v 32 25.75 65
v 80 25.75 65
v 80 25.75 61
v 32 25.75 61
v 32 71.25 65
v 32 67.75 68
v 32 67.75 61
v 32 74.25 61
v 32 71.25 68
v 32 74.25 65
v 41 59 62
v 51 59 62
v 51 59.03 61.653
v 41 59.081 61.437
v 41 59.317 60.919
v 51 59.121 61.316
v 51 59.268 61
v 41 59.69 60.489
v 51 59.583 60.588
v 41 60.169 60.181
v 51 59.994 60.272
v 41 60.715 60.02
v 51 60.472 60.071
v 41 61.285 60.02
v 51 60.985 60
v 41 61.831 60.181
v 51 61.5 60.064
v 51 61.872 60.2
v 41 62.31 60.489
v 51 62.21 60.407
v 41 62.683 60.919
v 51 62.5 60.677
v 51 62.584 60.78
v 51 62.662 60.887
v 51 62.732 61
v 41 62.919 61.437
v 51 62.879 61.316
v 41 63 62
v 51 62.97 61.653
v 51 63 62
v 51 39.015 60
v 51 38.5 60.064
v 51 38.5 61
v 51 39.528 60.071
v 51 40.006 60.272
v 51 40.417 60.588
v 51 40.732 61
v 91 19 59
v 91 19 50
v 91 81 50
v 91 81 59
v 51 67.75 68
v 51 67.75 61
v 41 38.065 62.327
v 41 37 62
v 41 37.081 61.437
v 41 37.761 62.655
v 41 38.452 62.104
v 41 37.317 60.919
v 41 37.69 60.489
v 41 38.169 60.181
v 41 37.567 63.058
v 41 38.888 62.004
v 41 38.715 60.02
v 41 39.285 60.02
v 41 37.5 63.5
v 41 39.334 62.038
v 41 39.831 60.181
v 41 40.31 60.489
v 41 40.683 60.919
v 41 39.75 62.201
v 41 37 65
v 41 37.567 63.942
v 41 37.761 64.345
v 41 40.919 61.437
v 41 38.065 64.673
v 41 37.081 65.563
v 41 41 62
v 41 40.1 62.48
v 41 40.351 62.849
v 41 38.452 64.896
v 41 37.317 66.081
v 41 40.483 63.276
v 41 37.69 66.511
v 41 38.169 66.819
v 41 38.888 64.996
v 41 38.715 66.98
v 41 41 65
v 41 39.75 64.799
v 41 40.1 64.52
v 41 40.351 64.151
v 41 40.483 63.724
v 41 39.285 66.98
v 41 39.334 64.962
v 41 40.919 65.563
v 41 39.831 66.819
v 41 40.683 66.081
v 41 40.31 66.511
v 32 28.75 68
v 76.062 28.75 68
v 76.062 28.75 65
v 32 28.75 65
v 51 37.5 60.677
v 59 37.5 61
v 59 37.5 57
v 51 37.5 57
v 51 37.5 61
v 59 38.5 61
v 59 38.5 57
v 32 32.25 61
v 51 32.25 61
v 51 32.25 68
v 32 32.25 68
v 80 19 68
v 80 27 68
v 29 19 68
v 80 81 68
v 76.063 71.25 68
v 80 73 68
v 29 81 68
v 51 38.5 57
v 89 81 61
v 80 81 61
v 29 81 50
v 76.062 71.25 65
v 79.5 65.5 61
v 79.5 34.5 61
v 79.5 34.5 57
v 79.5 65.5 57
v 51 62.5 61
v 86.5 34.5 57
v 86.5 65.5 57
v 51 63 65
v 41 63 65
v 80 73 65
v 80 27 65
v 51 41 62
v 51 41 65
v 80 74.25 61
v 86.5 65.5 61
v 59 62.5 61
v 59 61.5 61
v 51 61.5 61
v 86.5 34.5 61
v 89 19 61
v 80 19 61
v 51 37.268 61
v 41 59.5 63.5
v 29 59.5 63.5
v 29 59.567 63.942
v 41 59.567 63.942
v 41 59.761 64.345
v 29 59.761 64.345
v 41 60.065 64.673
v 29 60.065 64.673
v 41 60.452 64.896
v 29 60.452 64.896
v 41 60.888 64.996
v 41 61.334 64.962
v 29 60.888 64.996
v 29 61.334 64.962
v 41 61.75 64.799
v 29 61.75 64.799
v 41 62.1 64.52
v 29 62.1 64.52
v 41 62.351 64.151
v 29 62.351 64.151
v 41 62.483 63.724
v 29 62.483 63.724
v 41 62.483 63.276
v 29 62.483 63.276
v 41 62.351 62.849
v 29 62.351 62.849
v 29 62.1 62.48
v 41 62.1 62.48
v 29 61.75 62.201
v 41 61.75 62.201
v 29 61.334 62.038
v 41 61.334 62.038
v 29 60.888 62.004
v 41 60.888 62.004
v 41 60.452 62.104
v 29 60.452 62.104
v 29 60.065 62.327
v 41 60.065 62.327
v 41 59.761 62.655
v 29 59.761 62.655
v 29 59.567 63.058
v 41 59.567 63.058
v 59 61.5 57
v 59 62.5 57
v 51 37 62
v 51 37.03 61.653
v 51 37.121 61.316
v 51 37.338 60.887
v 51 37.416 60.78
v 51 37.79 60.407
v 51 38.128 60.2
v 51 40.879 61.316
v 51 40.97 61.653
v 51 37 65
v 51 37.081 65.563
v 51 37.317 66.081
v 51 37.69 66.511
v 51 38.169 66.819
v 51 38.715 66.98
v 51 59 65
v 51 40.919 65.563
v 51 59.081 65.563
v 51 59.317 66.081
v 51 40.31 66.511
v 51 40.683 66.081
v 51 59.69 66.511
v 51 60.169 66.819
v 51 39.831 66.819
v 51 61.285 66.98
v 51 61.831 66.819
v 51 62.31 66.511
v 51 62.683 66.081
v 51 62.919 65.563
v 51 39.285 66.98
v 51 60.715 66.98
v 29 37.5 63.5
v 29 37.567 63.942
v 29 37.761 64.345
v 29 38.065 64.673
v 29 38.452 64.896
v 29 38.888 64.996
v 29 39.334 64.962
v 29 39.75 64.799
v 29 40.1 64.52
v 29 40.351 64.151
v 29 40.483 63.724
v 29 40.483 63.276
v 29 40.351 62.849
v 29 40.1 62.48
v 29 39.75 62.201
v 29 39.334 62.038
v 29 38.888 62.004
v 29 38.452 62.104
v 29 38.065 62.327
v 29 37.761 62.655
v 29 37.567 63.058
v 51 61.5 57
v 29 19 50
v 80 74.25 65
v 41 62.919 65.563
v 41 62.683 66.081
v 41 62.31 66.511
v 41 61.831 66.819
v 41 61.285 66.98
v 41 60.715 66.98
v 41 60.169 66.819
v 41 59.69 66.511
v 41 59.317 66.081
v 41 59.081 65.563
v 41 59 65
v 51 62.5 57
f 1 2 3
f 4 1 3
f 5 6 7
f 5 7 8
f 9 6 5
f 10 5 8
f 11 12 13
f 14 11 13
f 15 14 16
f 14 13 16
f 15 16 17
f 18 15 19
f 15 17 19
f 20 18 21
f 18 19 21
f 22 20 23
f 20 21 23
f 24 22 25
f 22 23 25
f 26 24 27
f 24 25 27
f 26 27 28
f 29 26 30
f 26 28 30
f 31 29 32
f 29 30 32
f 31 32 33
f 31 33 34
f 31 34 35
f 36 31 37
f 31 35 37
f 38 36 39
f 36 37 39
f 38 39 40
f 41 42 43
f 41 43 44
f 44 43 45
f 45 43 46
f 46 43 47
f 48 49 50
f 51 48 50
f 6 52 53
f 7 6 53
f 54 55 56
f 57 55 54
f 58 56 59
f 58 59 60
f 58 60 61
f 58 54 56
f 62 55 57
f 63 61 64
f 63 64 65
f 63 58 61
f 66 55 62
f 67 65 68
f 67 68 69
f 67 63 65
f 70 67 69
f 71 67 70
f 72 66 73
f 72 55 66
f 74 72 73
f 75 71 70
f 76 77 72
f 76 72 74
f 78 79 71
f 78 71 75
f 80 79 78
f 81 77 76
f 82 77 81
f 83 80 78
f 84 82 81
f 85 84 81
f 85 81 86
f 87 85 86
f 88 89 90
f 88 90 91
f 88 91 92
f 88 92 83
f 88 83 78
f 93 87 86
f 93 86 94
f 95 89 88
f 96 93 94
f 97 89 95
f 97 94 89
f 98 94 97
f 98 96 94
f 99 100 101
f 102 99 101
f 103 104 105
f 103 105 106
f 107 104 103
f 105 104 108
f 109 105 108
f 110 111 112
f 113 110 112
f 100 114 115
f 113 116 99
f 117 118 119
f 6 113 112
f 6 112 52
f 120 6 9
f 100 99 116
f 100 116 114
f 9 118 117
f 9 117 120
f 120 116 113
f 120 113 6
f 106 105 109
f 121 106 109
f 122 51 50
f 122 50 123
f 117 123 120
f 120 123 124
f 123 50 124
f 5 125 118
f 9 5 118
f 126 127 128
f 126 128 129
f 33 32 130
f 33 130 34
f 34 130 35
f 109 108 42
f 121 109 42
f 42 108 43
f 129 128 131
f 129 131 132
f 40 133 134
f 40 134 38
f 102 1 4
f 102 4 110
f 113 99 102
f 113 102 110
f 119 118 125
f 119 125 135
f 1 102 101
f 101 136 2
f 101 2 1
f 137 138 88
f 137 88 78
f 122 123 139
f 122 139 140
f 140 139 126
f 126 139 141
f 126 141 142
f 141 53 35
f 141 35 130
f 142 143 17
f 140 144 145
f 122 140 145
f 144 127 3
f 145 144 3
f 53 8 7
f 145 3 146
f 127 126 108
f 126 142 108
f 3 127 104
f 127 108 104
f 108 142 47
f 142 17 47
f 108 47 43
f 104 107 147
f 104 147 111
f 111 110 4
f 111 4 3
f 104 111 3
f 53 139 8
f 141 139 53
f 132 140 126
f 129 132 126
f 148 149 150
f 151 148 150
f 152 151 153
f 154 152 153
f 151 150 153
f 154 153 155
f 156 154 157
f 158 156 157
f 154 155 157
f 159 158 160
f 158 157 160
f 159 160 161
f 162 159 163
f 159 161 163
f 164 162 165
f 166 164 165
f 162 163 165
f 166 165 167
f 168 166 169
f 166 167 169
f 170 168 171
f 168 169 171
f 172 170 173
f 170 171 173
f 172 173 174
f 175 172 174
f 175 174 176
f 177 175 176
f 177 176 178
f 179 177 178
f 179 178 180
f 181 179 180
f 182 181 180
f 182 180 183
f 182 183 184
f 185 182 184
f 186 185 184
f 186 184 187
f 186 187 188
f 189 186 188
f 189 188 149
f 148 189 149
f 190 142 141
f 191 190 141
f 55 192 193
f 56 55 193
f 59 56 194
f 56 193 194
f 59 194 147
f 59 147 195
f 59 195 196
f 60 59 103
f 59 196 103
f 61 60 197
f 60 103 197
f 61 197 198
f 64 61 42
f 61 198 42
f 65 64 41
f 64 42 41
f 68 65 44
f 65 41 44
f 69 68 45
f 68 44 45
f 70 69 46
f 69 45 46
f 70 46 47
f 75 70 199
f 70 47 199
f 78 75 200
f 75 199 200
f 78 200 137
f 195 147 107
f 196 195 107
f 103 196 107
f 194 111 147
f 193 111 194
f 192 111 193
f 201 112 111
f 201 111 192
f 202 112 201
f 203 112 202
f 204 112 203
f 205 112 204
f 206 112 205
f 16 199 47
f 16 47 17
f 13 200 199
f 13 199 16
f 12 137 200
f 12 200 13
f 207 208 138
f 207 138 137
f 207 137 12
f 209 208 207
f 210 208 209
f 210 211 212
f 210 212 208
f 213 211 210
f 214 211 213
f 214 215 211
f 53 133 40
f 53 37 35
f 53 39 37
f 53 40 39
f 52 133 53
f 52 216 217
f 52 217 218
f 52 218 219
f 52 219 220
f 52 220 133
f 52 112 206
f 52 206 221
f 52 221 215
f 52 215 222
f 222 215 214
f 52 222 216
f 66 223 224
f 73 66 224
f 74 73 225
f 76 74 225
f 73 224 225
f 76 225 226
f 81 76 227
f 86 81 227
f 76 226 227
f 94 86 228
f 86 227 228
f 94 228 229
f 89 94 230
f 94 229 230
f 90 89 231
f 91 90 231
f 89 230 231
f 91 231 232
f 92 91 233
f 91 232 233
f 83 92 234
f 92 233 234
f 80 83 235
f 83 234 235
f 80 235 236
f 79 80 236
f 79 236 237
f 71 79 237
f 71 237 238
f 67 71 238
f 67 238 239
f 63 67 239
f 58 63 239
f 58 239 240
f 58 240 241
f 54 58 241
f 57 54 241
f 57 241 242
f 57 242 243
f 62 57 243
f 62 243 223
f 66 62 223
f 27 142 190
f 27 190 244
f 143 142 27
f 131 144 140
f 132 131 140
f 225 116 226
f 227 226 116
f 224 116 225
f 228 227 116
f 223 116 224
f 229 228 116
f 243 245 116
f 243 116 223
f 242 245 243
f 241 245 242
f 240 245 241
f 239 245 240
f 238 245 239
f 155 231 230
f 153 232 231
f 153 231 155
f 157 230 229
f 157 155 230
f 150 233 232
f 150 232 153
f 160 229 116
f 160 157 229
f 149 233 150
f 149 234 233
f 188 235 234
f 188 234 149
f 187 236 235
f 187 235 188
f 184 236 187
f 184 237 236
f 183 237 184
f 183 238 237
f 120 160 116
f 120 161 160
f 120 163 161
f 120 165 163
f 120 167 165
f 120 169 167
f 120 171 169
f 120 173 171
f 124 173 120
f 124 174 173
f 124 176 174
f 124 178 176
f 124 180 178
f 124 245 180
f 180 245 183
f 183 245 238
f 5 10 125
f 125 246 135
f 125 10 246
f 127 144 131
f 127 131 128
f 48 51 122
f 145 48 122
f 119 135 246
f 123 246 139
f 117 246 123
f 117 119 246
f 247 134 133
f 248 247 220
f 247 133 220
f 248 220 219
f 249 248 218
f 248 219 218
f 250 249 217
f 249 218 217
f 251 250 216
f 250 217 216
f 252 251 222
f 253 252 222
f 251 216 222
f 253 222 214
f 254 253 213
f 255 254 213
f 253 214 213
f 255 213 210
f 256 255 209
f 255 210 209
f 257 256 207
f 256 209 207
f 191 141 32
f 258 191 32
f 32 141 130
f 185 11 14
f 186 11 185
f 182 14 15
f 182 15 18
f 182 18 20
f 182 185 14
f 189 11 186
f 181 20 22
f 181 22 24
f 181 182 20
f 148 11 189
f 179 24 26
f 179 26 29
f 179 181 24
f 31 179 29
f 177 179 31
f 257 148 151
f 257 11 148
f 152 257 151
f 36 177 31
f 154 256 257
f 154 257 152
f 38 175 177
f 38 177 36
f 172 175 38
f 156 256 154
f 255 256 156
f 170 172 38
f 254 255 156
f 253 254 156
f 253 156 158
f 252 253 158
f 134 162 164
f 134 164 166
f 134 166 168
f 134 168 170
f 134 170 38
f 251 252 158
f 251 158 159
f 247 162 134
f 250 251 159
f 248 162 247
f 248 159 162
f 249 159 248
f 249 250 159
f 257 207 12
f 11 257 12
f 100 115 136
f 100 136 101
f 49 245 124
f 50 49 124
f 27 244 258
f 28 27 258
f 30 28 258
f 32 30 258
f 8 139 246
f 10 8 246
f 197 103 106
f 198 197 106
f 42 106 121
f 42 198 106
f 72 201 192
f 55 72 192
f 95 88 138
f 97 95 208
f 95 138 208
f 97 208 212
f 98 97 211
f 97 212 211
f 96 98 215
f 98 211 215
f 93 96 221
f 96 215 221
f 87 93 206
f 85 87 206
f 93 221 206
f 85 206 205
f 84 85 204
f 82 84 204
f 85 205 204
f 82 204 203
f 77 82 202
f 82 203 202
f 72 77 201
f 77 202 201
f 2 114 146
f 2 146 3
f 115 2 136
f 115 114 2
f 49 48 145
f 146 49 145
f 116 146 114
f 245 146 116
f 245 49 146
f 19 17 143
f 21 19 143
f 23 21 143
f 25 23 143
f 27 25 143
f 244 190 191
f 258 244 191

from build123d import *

# Parameters (mm, degrees)
SKETCH072_W             = 62
SKETCH072_H             = 62
PAD012_DEPTH            = 18
POCKET059_DEPTH         = 59
POCKET060_DEPTH         = 7
SKETCH077_R             = 1.5
POCKET062_DEPTH         = 22
POCKET067_DEPTH         = 10
SKETCH076_W             = 31
SKETCH076_H             = 7
SKETCH076_W_2           = 1
SKETCH076_H_2           = 8
POCKET065_DEPTH         = 11
POCKET066_DEPTH         = 62.001
BODY012_PLACEMENT_ANGLE = 90


with BuildPart() as part:
    # Sketch072 → Pad012 (new body)
    with BuildSketch(Plane.XY):
        Rectangle(SKETCH072_W, SKETCH072_H)
    extrude(amount=PAD012_DEPTH)

    # Sketch074 → Pocket059 (cut)
    with BuildSketch(Plane.XZ.offset(31)):
        Polygon((-21.25, 20), (-21.25, 15), (-24.25, 15), (-24.25, 11), (-17.75, 11), (-17.75, 18), (17.75, 18), (17.75, 11), (24.25, 11), (24.25, 15), (21.25, 15), (21.25, 20), align=None)
    extrude(amount=-POCKET059_DEPTH, mode=Mode.SUBTRACT)

    # Sketch075 (on Face5 of Pocket059) → Pocket060 (cut)
    with BuildSketch(Plane.XY.offset(18)):
        Polygon((-19, -11), (-19, 9), (19, 9), (19, -11), (23, -20), (31, -20), (31, -31), (-31, -31), (-31, -20), (-23, -20), align=None)
    extrude(amount=-POCKET060_DEPTH, mode=Mode.SUBTRACT)

    # Sketch077 → Pocket062 (cut)
    with BuildSketch(Plane(origin=(0, 31, 0), x_dir=(-1, 0, 0), z_dir=(0, 1, 0))):
        with Locations((-11, 13.5)):
            Circle(SKETCH077_R)
        with Locations((11, 13.5)):
            Circle(SKETCH077_R)
    extrude(amount=-POCKET062_DEPTH, mode=Mode.SUBTRACT)

    # Sketch081 (on Face35 of Pocket062) → Pocket067 (cut)
    with BuildSketch(Plane.XZ.offset(-9)):
        with BuildLine():
            ThreePointArc((-9, 15), (-11, 17), (-13, 15))
            Line((-13, 15), (-13, 12))
            ThreePointArc((-13, 12), (-11, 10), (-9, 12))
            Line((-9, 15), (-9, 12))
        make_face()
        with BuildLine():
            ThreePointArc((13, 15), (11, 17), (9, 15))
            Line((9, 15), (9, 12))
            ThreePointArc((9, 12), (11, 10), (13, 12))
            Line((13, 15), (13, 12))
        make_face()
    extrude(amount=-POCKET067_DEPTH, mode=Mode.SUBTRACT)

    # Sketch076 (on Face4 of Pocket060) → Pocket065 (cut)
    with BuildSketch(Plane.XY.offset(18)):
        with Locations((0, -23)):
            Rectangle(SKETCH076_W, SKETCH076_H)
        with Locations((-12, 5)):
            Rectangle(SKETCH076_W_2, SKETCH076_H_2)
        with Locations((12, 5)):
            Rectangle(SKETCH076_W_2, SKETCH076_H_2)
    extrude(amount=-POCKET065_DEPTH, mode=Mode.SUBTRACT)

    # Sketch080 (on Face8 of Pocket065) → Pocket066 (cut, through all)
    with BuildSketch(Plane.YZ.offset(31)):
        Polygon((-31, 11), (-31, 9), (-29, 11), align=None)
    extrude(amount=-POCKET066_DEPTH, mode=Mode.SUBTRACT)


with BuildPart() as part_1:
    # Body012 placement: moved
    add(part.part.moved(Location((60, 50, 50))).rotate(Axis((60, 50, 50), (0, 0, 1)), BODY012_PLACEMENT_ANGLE))


solid = part_1.part
